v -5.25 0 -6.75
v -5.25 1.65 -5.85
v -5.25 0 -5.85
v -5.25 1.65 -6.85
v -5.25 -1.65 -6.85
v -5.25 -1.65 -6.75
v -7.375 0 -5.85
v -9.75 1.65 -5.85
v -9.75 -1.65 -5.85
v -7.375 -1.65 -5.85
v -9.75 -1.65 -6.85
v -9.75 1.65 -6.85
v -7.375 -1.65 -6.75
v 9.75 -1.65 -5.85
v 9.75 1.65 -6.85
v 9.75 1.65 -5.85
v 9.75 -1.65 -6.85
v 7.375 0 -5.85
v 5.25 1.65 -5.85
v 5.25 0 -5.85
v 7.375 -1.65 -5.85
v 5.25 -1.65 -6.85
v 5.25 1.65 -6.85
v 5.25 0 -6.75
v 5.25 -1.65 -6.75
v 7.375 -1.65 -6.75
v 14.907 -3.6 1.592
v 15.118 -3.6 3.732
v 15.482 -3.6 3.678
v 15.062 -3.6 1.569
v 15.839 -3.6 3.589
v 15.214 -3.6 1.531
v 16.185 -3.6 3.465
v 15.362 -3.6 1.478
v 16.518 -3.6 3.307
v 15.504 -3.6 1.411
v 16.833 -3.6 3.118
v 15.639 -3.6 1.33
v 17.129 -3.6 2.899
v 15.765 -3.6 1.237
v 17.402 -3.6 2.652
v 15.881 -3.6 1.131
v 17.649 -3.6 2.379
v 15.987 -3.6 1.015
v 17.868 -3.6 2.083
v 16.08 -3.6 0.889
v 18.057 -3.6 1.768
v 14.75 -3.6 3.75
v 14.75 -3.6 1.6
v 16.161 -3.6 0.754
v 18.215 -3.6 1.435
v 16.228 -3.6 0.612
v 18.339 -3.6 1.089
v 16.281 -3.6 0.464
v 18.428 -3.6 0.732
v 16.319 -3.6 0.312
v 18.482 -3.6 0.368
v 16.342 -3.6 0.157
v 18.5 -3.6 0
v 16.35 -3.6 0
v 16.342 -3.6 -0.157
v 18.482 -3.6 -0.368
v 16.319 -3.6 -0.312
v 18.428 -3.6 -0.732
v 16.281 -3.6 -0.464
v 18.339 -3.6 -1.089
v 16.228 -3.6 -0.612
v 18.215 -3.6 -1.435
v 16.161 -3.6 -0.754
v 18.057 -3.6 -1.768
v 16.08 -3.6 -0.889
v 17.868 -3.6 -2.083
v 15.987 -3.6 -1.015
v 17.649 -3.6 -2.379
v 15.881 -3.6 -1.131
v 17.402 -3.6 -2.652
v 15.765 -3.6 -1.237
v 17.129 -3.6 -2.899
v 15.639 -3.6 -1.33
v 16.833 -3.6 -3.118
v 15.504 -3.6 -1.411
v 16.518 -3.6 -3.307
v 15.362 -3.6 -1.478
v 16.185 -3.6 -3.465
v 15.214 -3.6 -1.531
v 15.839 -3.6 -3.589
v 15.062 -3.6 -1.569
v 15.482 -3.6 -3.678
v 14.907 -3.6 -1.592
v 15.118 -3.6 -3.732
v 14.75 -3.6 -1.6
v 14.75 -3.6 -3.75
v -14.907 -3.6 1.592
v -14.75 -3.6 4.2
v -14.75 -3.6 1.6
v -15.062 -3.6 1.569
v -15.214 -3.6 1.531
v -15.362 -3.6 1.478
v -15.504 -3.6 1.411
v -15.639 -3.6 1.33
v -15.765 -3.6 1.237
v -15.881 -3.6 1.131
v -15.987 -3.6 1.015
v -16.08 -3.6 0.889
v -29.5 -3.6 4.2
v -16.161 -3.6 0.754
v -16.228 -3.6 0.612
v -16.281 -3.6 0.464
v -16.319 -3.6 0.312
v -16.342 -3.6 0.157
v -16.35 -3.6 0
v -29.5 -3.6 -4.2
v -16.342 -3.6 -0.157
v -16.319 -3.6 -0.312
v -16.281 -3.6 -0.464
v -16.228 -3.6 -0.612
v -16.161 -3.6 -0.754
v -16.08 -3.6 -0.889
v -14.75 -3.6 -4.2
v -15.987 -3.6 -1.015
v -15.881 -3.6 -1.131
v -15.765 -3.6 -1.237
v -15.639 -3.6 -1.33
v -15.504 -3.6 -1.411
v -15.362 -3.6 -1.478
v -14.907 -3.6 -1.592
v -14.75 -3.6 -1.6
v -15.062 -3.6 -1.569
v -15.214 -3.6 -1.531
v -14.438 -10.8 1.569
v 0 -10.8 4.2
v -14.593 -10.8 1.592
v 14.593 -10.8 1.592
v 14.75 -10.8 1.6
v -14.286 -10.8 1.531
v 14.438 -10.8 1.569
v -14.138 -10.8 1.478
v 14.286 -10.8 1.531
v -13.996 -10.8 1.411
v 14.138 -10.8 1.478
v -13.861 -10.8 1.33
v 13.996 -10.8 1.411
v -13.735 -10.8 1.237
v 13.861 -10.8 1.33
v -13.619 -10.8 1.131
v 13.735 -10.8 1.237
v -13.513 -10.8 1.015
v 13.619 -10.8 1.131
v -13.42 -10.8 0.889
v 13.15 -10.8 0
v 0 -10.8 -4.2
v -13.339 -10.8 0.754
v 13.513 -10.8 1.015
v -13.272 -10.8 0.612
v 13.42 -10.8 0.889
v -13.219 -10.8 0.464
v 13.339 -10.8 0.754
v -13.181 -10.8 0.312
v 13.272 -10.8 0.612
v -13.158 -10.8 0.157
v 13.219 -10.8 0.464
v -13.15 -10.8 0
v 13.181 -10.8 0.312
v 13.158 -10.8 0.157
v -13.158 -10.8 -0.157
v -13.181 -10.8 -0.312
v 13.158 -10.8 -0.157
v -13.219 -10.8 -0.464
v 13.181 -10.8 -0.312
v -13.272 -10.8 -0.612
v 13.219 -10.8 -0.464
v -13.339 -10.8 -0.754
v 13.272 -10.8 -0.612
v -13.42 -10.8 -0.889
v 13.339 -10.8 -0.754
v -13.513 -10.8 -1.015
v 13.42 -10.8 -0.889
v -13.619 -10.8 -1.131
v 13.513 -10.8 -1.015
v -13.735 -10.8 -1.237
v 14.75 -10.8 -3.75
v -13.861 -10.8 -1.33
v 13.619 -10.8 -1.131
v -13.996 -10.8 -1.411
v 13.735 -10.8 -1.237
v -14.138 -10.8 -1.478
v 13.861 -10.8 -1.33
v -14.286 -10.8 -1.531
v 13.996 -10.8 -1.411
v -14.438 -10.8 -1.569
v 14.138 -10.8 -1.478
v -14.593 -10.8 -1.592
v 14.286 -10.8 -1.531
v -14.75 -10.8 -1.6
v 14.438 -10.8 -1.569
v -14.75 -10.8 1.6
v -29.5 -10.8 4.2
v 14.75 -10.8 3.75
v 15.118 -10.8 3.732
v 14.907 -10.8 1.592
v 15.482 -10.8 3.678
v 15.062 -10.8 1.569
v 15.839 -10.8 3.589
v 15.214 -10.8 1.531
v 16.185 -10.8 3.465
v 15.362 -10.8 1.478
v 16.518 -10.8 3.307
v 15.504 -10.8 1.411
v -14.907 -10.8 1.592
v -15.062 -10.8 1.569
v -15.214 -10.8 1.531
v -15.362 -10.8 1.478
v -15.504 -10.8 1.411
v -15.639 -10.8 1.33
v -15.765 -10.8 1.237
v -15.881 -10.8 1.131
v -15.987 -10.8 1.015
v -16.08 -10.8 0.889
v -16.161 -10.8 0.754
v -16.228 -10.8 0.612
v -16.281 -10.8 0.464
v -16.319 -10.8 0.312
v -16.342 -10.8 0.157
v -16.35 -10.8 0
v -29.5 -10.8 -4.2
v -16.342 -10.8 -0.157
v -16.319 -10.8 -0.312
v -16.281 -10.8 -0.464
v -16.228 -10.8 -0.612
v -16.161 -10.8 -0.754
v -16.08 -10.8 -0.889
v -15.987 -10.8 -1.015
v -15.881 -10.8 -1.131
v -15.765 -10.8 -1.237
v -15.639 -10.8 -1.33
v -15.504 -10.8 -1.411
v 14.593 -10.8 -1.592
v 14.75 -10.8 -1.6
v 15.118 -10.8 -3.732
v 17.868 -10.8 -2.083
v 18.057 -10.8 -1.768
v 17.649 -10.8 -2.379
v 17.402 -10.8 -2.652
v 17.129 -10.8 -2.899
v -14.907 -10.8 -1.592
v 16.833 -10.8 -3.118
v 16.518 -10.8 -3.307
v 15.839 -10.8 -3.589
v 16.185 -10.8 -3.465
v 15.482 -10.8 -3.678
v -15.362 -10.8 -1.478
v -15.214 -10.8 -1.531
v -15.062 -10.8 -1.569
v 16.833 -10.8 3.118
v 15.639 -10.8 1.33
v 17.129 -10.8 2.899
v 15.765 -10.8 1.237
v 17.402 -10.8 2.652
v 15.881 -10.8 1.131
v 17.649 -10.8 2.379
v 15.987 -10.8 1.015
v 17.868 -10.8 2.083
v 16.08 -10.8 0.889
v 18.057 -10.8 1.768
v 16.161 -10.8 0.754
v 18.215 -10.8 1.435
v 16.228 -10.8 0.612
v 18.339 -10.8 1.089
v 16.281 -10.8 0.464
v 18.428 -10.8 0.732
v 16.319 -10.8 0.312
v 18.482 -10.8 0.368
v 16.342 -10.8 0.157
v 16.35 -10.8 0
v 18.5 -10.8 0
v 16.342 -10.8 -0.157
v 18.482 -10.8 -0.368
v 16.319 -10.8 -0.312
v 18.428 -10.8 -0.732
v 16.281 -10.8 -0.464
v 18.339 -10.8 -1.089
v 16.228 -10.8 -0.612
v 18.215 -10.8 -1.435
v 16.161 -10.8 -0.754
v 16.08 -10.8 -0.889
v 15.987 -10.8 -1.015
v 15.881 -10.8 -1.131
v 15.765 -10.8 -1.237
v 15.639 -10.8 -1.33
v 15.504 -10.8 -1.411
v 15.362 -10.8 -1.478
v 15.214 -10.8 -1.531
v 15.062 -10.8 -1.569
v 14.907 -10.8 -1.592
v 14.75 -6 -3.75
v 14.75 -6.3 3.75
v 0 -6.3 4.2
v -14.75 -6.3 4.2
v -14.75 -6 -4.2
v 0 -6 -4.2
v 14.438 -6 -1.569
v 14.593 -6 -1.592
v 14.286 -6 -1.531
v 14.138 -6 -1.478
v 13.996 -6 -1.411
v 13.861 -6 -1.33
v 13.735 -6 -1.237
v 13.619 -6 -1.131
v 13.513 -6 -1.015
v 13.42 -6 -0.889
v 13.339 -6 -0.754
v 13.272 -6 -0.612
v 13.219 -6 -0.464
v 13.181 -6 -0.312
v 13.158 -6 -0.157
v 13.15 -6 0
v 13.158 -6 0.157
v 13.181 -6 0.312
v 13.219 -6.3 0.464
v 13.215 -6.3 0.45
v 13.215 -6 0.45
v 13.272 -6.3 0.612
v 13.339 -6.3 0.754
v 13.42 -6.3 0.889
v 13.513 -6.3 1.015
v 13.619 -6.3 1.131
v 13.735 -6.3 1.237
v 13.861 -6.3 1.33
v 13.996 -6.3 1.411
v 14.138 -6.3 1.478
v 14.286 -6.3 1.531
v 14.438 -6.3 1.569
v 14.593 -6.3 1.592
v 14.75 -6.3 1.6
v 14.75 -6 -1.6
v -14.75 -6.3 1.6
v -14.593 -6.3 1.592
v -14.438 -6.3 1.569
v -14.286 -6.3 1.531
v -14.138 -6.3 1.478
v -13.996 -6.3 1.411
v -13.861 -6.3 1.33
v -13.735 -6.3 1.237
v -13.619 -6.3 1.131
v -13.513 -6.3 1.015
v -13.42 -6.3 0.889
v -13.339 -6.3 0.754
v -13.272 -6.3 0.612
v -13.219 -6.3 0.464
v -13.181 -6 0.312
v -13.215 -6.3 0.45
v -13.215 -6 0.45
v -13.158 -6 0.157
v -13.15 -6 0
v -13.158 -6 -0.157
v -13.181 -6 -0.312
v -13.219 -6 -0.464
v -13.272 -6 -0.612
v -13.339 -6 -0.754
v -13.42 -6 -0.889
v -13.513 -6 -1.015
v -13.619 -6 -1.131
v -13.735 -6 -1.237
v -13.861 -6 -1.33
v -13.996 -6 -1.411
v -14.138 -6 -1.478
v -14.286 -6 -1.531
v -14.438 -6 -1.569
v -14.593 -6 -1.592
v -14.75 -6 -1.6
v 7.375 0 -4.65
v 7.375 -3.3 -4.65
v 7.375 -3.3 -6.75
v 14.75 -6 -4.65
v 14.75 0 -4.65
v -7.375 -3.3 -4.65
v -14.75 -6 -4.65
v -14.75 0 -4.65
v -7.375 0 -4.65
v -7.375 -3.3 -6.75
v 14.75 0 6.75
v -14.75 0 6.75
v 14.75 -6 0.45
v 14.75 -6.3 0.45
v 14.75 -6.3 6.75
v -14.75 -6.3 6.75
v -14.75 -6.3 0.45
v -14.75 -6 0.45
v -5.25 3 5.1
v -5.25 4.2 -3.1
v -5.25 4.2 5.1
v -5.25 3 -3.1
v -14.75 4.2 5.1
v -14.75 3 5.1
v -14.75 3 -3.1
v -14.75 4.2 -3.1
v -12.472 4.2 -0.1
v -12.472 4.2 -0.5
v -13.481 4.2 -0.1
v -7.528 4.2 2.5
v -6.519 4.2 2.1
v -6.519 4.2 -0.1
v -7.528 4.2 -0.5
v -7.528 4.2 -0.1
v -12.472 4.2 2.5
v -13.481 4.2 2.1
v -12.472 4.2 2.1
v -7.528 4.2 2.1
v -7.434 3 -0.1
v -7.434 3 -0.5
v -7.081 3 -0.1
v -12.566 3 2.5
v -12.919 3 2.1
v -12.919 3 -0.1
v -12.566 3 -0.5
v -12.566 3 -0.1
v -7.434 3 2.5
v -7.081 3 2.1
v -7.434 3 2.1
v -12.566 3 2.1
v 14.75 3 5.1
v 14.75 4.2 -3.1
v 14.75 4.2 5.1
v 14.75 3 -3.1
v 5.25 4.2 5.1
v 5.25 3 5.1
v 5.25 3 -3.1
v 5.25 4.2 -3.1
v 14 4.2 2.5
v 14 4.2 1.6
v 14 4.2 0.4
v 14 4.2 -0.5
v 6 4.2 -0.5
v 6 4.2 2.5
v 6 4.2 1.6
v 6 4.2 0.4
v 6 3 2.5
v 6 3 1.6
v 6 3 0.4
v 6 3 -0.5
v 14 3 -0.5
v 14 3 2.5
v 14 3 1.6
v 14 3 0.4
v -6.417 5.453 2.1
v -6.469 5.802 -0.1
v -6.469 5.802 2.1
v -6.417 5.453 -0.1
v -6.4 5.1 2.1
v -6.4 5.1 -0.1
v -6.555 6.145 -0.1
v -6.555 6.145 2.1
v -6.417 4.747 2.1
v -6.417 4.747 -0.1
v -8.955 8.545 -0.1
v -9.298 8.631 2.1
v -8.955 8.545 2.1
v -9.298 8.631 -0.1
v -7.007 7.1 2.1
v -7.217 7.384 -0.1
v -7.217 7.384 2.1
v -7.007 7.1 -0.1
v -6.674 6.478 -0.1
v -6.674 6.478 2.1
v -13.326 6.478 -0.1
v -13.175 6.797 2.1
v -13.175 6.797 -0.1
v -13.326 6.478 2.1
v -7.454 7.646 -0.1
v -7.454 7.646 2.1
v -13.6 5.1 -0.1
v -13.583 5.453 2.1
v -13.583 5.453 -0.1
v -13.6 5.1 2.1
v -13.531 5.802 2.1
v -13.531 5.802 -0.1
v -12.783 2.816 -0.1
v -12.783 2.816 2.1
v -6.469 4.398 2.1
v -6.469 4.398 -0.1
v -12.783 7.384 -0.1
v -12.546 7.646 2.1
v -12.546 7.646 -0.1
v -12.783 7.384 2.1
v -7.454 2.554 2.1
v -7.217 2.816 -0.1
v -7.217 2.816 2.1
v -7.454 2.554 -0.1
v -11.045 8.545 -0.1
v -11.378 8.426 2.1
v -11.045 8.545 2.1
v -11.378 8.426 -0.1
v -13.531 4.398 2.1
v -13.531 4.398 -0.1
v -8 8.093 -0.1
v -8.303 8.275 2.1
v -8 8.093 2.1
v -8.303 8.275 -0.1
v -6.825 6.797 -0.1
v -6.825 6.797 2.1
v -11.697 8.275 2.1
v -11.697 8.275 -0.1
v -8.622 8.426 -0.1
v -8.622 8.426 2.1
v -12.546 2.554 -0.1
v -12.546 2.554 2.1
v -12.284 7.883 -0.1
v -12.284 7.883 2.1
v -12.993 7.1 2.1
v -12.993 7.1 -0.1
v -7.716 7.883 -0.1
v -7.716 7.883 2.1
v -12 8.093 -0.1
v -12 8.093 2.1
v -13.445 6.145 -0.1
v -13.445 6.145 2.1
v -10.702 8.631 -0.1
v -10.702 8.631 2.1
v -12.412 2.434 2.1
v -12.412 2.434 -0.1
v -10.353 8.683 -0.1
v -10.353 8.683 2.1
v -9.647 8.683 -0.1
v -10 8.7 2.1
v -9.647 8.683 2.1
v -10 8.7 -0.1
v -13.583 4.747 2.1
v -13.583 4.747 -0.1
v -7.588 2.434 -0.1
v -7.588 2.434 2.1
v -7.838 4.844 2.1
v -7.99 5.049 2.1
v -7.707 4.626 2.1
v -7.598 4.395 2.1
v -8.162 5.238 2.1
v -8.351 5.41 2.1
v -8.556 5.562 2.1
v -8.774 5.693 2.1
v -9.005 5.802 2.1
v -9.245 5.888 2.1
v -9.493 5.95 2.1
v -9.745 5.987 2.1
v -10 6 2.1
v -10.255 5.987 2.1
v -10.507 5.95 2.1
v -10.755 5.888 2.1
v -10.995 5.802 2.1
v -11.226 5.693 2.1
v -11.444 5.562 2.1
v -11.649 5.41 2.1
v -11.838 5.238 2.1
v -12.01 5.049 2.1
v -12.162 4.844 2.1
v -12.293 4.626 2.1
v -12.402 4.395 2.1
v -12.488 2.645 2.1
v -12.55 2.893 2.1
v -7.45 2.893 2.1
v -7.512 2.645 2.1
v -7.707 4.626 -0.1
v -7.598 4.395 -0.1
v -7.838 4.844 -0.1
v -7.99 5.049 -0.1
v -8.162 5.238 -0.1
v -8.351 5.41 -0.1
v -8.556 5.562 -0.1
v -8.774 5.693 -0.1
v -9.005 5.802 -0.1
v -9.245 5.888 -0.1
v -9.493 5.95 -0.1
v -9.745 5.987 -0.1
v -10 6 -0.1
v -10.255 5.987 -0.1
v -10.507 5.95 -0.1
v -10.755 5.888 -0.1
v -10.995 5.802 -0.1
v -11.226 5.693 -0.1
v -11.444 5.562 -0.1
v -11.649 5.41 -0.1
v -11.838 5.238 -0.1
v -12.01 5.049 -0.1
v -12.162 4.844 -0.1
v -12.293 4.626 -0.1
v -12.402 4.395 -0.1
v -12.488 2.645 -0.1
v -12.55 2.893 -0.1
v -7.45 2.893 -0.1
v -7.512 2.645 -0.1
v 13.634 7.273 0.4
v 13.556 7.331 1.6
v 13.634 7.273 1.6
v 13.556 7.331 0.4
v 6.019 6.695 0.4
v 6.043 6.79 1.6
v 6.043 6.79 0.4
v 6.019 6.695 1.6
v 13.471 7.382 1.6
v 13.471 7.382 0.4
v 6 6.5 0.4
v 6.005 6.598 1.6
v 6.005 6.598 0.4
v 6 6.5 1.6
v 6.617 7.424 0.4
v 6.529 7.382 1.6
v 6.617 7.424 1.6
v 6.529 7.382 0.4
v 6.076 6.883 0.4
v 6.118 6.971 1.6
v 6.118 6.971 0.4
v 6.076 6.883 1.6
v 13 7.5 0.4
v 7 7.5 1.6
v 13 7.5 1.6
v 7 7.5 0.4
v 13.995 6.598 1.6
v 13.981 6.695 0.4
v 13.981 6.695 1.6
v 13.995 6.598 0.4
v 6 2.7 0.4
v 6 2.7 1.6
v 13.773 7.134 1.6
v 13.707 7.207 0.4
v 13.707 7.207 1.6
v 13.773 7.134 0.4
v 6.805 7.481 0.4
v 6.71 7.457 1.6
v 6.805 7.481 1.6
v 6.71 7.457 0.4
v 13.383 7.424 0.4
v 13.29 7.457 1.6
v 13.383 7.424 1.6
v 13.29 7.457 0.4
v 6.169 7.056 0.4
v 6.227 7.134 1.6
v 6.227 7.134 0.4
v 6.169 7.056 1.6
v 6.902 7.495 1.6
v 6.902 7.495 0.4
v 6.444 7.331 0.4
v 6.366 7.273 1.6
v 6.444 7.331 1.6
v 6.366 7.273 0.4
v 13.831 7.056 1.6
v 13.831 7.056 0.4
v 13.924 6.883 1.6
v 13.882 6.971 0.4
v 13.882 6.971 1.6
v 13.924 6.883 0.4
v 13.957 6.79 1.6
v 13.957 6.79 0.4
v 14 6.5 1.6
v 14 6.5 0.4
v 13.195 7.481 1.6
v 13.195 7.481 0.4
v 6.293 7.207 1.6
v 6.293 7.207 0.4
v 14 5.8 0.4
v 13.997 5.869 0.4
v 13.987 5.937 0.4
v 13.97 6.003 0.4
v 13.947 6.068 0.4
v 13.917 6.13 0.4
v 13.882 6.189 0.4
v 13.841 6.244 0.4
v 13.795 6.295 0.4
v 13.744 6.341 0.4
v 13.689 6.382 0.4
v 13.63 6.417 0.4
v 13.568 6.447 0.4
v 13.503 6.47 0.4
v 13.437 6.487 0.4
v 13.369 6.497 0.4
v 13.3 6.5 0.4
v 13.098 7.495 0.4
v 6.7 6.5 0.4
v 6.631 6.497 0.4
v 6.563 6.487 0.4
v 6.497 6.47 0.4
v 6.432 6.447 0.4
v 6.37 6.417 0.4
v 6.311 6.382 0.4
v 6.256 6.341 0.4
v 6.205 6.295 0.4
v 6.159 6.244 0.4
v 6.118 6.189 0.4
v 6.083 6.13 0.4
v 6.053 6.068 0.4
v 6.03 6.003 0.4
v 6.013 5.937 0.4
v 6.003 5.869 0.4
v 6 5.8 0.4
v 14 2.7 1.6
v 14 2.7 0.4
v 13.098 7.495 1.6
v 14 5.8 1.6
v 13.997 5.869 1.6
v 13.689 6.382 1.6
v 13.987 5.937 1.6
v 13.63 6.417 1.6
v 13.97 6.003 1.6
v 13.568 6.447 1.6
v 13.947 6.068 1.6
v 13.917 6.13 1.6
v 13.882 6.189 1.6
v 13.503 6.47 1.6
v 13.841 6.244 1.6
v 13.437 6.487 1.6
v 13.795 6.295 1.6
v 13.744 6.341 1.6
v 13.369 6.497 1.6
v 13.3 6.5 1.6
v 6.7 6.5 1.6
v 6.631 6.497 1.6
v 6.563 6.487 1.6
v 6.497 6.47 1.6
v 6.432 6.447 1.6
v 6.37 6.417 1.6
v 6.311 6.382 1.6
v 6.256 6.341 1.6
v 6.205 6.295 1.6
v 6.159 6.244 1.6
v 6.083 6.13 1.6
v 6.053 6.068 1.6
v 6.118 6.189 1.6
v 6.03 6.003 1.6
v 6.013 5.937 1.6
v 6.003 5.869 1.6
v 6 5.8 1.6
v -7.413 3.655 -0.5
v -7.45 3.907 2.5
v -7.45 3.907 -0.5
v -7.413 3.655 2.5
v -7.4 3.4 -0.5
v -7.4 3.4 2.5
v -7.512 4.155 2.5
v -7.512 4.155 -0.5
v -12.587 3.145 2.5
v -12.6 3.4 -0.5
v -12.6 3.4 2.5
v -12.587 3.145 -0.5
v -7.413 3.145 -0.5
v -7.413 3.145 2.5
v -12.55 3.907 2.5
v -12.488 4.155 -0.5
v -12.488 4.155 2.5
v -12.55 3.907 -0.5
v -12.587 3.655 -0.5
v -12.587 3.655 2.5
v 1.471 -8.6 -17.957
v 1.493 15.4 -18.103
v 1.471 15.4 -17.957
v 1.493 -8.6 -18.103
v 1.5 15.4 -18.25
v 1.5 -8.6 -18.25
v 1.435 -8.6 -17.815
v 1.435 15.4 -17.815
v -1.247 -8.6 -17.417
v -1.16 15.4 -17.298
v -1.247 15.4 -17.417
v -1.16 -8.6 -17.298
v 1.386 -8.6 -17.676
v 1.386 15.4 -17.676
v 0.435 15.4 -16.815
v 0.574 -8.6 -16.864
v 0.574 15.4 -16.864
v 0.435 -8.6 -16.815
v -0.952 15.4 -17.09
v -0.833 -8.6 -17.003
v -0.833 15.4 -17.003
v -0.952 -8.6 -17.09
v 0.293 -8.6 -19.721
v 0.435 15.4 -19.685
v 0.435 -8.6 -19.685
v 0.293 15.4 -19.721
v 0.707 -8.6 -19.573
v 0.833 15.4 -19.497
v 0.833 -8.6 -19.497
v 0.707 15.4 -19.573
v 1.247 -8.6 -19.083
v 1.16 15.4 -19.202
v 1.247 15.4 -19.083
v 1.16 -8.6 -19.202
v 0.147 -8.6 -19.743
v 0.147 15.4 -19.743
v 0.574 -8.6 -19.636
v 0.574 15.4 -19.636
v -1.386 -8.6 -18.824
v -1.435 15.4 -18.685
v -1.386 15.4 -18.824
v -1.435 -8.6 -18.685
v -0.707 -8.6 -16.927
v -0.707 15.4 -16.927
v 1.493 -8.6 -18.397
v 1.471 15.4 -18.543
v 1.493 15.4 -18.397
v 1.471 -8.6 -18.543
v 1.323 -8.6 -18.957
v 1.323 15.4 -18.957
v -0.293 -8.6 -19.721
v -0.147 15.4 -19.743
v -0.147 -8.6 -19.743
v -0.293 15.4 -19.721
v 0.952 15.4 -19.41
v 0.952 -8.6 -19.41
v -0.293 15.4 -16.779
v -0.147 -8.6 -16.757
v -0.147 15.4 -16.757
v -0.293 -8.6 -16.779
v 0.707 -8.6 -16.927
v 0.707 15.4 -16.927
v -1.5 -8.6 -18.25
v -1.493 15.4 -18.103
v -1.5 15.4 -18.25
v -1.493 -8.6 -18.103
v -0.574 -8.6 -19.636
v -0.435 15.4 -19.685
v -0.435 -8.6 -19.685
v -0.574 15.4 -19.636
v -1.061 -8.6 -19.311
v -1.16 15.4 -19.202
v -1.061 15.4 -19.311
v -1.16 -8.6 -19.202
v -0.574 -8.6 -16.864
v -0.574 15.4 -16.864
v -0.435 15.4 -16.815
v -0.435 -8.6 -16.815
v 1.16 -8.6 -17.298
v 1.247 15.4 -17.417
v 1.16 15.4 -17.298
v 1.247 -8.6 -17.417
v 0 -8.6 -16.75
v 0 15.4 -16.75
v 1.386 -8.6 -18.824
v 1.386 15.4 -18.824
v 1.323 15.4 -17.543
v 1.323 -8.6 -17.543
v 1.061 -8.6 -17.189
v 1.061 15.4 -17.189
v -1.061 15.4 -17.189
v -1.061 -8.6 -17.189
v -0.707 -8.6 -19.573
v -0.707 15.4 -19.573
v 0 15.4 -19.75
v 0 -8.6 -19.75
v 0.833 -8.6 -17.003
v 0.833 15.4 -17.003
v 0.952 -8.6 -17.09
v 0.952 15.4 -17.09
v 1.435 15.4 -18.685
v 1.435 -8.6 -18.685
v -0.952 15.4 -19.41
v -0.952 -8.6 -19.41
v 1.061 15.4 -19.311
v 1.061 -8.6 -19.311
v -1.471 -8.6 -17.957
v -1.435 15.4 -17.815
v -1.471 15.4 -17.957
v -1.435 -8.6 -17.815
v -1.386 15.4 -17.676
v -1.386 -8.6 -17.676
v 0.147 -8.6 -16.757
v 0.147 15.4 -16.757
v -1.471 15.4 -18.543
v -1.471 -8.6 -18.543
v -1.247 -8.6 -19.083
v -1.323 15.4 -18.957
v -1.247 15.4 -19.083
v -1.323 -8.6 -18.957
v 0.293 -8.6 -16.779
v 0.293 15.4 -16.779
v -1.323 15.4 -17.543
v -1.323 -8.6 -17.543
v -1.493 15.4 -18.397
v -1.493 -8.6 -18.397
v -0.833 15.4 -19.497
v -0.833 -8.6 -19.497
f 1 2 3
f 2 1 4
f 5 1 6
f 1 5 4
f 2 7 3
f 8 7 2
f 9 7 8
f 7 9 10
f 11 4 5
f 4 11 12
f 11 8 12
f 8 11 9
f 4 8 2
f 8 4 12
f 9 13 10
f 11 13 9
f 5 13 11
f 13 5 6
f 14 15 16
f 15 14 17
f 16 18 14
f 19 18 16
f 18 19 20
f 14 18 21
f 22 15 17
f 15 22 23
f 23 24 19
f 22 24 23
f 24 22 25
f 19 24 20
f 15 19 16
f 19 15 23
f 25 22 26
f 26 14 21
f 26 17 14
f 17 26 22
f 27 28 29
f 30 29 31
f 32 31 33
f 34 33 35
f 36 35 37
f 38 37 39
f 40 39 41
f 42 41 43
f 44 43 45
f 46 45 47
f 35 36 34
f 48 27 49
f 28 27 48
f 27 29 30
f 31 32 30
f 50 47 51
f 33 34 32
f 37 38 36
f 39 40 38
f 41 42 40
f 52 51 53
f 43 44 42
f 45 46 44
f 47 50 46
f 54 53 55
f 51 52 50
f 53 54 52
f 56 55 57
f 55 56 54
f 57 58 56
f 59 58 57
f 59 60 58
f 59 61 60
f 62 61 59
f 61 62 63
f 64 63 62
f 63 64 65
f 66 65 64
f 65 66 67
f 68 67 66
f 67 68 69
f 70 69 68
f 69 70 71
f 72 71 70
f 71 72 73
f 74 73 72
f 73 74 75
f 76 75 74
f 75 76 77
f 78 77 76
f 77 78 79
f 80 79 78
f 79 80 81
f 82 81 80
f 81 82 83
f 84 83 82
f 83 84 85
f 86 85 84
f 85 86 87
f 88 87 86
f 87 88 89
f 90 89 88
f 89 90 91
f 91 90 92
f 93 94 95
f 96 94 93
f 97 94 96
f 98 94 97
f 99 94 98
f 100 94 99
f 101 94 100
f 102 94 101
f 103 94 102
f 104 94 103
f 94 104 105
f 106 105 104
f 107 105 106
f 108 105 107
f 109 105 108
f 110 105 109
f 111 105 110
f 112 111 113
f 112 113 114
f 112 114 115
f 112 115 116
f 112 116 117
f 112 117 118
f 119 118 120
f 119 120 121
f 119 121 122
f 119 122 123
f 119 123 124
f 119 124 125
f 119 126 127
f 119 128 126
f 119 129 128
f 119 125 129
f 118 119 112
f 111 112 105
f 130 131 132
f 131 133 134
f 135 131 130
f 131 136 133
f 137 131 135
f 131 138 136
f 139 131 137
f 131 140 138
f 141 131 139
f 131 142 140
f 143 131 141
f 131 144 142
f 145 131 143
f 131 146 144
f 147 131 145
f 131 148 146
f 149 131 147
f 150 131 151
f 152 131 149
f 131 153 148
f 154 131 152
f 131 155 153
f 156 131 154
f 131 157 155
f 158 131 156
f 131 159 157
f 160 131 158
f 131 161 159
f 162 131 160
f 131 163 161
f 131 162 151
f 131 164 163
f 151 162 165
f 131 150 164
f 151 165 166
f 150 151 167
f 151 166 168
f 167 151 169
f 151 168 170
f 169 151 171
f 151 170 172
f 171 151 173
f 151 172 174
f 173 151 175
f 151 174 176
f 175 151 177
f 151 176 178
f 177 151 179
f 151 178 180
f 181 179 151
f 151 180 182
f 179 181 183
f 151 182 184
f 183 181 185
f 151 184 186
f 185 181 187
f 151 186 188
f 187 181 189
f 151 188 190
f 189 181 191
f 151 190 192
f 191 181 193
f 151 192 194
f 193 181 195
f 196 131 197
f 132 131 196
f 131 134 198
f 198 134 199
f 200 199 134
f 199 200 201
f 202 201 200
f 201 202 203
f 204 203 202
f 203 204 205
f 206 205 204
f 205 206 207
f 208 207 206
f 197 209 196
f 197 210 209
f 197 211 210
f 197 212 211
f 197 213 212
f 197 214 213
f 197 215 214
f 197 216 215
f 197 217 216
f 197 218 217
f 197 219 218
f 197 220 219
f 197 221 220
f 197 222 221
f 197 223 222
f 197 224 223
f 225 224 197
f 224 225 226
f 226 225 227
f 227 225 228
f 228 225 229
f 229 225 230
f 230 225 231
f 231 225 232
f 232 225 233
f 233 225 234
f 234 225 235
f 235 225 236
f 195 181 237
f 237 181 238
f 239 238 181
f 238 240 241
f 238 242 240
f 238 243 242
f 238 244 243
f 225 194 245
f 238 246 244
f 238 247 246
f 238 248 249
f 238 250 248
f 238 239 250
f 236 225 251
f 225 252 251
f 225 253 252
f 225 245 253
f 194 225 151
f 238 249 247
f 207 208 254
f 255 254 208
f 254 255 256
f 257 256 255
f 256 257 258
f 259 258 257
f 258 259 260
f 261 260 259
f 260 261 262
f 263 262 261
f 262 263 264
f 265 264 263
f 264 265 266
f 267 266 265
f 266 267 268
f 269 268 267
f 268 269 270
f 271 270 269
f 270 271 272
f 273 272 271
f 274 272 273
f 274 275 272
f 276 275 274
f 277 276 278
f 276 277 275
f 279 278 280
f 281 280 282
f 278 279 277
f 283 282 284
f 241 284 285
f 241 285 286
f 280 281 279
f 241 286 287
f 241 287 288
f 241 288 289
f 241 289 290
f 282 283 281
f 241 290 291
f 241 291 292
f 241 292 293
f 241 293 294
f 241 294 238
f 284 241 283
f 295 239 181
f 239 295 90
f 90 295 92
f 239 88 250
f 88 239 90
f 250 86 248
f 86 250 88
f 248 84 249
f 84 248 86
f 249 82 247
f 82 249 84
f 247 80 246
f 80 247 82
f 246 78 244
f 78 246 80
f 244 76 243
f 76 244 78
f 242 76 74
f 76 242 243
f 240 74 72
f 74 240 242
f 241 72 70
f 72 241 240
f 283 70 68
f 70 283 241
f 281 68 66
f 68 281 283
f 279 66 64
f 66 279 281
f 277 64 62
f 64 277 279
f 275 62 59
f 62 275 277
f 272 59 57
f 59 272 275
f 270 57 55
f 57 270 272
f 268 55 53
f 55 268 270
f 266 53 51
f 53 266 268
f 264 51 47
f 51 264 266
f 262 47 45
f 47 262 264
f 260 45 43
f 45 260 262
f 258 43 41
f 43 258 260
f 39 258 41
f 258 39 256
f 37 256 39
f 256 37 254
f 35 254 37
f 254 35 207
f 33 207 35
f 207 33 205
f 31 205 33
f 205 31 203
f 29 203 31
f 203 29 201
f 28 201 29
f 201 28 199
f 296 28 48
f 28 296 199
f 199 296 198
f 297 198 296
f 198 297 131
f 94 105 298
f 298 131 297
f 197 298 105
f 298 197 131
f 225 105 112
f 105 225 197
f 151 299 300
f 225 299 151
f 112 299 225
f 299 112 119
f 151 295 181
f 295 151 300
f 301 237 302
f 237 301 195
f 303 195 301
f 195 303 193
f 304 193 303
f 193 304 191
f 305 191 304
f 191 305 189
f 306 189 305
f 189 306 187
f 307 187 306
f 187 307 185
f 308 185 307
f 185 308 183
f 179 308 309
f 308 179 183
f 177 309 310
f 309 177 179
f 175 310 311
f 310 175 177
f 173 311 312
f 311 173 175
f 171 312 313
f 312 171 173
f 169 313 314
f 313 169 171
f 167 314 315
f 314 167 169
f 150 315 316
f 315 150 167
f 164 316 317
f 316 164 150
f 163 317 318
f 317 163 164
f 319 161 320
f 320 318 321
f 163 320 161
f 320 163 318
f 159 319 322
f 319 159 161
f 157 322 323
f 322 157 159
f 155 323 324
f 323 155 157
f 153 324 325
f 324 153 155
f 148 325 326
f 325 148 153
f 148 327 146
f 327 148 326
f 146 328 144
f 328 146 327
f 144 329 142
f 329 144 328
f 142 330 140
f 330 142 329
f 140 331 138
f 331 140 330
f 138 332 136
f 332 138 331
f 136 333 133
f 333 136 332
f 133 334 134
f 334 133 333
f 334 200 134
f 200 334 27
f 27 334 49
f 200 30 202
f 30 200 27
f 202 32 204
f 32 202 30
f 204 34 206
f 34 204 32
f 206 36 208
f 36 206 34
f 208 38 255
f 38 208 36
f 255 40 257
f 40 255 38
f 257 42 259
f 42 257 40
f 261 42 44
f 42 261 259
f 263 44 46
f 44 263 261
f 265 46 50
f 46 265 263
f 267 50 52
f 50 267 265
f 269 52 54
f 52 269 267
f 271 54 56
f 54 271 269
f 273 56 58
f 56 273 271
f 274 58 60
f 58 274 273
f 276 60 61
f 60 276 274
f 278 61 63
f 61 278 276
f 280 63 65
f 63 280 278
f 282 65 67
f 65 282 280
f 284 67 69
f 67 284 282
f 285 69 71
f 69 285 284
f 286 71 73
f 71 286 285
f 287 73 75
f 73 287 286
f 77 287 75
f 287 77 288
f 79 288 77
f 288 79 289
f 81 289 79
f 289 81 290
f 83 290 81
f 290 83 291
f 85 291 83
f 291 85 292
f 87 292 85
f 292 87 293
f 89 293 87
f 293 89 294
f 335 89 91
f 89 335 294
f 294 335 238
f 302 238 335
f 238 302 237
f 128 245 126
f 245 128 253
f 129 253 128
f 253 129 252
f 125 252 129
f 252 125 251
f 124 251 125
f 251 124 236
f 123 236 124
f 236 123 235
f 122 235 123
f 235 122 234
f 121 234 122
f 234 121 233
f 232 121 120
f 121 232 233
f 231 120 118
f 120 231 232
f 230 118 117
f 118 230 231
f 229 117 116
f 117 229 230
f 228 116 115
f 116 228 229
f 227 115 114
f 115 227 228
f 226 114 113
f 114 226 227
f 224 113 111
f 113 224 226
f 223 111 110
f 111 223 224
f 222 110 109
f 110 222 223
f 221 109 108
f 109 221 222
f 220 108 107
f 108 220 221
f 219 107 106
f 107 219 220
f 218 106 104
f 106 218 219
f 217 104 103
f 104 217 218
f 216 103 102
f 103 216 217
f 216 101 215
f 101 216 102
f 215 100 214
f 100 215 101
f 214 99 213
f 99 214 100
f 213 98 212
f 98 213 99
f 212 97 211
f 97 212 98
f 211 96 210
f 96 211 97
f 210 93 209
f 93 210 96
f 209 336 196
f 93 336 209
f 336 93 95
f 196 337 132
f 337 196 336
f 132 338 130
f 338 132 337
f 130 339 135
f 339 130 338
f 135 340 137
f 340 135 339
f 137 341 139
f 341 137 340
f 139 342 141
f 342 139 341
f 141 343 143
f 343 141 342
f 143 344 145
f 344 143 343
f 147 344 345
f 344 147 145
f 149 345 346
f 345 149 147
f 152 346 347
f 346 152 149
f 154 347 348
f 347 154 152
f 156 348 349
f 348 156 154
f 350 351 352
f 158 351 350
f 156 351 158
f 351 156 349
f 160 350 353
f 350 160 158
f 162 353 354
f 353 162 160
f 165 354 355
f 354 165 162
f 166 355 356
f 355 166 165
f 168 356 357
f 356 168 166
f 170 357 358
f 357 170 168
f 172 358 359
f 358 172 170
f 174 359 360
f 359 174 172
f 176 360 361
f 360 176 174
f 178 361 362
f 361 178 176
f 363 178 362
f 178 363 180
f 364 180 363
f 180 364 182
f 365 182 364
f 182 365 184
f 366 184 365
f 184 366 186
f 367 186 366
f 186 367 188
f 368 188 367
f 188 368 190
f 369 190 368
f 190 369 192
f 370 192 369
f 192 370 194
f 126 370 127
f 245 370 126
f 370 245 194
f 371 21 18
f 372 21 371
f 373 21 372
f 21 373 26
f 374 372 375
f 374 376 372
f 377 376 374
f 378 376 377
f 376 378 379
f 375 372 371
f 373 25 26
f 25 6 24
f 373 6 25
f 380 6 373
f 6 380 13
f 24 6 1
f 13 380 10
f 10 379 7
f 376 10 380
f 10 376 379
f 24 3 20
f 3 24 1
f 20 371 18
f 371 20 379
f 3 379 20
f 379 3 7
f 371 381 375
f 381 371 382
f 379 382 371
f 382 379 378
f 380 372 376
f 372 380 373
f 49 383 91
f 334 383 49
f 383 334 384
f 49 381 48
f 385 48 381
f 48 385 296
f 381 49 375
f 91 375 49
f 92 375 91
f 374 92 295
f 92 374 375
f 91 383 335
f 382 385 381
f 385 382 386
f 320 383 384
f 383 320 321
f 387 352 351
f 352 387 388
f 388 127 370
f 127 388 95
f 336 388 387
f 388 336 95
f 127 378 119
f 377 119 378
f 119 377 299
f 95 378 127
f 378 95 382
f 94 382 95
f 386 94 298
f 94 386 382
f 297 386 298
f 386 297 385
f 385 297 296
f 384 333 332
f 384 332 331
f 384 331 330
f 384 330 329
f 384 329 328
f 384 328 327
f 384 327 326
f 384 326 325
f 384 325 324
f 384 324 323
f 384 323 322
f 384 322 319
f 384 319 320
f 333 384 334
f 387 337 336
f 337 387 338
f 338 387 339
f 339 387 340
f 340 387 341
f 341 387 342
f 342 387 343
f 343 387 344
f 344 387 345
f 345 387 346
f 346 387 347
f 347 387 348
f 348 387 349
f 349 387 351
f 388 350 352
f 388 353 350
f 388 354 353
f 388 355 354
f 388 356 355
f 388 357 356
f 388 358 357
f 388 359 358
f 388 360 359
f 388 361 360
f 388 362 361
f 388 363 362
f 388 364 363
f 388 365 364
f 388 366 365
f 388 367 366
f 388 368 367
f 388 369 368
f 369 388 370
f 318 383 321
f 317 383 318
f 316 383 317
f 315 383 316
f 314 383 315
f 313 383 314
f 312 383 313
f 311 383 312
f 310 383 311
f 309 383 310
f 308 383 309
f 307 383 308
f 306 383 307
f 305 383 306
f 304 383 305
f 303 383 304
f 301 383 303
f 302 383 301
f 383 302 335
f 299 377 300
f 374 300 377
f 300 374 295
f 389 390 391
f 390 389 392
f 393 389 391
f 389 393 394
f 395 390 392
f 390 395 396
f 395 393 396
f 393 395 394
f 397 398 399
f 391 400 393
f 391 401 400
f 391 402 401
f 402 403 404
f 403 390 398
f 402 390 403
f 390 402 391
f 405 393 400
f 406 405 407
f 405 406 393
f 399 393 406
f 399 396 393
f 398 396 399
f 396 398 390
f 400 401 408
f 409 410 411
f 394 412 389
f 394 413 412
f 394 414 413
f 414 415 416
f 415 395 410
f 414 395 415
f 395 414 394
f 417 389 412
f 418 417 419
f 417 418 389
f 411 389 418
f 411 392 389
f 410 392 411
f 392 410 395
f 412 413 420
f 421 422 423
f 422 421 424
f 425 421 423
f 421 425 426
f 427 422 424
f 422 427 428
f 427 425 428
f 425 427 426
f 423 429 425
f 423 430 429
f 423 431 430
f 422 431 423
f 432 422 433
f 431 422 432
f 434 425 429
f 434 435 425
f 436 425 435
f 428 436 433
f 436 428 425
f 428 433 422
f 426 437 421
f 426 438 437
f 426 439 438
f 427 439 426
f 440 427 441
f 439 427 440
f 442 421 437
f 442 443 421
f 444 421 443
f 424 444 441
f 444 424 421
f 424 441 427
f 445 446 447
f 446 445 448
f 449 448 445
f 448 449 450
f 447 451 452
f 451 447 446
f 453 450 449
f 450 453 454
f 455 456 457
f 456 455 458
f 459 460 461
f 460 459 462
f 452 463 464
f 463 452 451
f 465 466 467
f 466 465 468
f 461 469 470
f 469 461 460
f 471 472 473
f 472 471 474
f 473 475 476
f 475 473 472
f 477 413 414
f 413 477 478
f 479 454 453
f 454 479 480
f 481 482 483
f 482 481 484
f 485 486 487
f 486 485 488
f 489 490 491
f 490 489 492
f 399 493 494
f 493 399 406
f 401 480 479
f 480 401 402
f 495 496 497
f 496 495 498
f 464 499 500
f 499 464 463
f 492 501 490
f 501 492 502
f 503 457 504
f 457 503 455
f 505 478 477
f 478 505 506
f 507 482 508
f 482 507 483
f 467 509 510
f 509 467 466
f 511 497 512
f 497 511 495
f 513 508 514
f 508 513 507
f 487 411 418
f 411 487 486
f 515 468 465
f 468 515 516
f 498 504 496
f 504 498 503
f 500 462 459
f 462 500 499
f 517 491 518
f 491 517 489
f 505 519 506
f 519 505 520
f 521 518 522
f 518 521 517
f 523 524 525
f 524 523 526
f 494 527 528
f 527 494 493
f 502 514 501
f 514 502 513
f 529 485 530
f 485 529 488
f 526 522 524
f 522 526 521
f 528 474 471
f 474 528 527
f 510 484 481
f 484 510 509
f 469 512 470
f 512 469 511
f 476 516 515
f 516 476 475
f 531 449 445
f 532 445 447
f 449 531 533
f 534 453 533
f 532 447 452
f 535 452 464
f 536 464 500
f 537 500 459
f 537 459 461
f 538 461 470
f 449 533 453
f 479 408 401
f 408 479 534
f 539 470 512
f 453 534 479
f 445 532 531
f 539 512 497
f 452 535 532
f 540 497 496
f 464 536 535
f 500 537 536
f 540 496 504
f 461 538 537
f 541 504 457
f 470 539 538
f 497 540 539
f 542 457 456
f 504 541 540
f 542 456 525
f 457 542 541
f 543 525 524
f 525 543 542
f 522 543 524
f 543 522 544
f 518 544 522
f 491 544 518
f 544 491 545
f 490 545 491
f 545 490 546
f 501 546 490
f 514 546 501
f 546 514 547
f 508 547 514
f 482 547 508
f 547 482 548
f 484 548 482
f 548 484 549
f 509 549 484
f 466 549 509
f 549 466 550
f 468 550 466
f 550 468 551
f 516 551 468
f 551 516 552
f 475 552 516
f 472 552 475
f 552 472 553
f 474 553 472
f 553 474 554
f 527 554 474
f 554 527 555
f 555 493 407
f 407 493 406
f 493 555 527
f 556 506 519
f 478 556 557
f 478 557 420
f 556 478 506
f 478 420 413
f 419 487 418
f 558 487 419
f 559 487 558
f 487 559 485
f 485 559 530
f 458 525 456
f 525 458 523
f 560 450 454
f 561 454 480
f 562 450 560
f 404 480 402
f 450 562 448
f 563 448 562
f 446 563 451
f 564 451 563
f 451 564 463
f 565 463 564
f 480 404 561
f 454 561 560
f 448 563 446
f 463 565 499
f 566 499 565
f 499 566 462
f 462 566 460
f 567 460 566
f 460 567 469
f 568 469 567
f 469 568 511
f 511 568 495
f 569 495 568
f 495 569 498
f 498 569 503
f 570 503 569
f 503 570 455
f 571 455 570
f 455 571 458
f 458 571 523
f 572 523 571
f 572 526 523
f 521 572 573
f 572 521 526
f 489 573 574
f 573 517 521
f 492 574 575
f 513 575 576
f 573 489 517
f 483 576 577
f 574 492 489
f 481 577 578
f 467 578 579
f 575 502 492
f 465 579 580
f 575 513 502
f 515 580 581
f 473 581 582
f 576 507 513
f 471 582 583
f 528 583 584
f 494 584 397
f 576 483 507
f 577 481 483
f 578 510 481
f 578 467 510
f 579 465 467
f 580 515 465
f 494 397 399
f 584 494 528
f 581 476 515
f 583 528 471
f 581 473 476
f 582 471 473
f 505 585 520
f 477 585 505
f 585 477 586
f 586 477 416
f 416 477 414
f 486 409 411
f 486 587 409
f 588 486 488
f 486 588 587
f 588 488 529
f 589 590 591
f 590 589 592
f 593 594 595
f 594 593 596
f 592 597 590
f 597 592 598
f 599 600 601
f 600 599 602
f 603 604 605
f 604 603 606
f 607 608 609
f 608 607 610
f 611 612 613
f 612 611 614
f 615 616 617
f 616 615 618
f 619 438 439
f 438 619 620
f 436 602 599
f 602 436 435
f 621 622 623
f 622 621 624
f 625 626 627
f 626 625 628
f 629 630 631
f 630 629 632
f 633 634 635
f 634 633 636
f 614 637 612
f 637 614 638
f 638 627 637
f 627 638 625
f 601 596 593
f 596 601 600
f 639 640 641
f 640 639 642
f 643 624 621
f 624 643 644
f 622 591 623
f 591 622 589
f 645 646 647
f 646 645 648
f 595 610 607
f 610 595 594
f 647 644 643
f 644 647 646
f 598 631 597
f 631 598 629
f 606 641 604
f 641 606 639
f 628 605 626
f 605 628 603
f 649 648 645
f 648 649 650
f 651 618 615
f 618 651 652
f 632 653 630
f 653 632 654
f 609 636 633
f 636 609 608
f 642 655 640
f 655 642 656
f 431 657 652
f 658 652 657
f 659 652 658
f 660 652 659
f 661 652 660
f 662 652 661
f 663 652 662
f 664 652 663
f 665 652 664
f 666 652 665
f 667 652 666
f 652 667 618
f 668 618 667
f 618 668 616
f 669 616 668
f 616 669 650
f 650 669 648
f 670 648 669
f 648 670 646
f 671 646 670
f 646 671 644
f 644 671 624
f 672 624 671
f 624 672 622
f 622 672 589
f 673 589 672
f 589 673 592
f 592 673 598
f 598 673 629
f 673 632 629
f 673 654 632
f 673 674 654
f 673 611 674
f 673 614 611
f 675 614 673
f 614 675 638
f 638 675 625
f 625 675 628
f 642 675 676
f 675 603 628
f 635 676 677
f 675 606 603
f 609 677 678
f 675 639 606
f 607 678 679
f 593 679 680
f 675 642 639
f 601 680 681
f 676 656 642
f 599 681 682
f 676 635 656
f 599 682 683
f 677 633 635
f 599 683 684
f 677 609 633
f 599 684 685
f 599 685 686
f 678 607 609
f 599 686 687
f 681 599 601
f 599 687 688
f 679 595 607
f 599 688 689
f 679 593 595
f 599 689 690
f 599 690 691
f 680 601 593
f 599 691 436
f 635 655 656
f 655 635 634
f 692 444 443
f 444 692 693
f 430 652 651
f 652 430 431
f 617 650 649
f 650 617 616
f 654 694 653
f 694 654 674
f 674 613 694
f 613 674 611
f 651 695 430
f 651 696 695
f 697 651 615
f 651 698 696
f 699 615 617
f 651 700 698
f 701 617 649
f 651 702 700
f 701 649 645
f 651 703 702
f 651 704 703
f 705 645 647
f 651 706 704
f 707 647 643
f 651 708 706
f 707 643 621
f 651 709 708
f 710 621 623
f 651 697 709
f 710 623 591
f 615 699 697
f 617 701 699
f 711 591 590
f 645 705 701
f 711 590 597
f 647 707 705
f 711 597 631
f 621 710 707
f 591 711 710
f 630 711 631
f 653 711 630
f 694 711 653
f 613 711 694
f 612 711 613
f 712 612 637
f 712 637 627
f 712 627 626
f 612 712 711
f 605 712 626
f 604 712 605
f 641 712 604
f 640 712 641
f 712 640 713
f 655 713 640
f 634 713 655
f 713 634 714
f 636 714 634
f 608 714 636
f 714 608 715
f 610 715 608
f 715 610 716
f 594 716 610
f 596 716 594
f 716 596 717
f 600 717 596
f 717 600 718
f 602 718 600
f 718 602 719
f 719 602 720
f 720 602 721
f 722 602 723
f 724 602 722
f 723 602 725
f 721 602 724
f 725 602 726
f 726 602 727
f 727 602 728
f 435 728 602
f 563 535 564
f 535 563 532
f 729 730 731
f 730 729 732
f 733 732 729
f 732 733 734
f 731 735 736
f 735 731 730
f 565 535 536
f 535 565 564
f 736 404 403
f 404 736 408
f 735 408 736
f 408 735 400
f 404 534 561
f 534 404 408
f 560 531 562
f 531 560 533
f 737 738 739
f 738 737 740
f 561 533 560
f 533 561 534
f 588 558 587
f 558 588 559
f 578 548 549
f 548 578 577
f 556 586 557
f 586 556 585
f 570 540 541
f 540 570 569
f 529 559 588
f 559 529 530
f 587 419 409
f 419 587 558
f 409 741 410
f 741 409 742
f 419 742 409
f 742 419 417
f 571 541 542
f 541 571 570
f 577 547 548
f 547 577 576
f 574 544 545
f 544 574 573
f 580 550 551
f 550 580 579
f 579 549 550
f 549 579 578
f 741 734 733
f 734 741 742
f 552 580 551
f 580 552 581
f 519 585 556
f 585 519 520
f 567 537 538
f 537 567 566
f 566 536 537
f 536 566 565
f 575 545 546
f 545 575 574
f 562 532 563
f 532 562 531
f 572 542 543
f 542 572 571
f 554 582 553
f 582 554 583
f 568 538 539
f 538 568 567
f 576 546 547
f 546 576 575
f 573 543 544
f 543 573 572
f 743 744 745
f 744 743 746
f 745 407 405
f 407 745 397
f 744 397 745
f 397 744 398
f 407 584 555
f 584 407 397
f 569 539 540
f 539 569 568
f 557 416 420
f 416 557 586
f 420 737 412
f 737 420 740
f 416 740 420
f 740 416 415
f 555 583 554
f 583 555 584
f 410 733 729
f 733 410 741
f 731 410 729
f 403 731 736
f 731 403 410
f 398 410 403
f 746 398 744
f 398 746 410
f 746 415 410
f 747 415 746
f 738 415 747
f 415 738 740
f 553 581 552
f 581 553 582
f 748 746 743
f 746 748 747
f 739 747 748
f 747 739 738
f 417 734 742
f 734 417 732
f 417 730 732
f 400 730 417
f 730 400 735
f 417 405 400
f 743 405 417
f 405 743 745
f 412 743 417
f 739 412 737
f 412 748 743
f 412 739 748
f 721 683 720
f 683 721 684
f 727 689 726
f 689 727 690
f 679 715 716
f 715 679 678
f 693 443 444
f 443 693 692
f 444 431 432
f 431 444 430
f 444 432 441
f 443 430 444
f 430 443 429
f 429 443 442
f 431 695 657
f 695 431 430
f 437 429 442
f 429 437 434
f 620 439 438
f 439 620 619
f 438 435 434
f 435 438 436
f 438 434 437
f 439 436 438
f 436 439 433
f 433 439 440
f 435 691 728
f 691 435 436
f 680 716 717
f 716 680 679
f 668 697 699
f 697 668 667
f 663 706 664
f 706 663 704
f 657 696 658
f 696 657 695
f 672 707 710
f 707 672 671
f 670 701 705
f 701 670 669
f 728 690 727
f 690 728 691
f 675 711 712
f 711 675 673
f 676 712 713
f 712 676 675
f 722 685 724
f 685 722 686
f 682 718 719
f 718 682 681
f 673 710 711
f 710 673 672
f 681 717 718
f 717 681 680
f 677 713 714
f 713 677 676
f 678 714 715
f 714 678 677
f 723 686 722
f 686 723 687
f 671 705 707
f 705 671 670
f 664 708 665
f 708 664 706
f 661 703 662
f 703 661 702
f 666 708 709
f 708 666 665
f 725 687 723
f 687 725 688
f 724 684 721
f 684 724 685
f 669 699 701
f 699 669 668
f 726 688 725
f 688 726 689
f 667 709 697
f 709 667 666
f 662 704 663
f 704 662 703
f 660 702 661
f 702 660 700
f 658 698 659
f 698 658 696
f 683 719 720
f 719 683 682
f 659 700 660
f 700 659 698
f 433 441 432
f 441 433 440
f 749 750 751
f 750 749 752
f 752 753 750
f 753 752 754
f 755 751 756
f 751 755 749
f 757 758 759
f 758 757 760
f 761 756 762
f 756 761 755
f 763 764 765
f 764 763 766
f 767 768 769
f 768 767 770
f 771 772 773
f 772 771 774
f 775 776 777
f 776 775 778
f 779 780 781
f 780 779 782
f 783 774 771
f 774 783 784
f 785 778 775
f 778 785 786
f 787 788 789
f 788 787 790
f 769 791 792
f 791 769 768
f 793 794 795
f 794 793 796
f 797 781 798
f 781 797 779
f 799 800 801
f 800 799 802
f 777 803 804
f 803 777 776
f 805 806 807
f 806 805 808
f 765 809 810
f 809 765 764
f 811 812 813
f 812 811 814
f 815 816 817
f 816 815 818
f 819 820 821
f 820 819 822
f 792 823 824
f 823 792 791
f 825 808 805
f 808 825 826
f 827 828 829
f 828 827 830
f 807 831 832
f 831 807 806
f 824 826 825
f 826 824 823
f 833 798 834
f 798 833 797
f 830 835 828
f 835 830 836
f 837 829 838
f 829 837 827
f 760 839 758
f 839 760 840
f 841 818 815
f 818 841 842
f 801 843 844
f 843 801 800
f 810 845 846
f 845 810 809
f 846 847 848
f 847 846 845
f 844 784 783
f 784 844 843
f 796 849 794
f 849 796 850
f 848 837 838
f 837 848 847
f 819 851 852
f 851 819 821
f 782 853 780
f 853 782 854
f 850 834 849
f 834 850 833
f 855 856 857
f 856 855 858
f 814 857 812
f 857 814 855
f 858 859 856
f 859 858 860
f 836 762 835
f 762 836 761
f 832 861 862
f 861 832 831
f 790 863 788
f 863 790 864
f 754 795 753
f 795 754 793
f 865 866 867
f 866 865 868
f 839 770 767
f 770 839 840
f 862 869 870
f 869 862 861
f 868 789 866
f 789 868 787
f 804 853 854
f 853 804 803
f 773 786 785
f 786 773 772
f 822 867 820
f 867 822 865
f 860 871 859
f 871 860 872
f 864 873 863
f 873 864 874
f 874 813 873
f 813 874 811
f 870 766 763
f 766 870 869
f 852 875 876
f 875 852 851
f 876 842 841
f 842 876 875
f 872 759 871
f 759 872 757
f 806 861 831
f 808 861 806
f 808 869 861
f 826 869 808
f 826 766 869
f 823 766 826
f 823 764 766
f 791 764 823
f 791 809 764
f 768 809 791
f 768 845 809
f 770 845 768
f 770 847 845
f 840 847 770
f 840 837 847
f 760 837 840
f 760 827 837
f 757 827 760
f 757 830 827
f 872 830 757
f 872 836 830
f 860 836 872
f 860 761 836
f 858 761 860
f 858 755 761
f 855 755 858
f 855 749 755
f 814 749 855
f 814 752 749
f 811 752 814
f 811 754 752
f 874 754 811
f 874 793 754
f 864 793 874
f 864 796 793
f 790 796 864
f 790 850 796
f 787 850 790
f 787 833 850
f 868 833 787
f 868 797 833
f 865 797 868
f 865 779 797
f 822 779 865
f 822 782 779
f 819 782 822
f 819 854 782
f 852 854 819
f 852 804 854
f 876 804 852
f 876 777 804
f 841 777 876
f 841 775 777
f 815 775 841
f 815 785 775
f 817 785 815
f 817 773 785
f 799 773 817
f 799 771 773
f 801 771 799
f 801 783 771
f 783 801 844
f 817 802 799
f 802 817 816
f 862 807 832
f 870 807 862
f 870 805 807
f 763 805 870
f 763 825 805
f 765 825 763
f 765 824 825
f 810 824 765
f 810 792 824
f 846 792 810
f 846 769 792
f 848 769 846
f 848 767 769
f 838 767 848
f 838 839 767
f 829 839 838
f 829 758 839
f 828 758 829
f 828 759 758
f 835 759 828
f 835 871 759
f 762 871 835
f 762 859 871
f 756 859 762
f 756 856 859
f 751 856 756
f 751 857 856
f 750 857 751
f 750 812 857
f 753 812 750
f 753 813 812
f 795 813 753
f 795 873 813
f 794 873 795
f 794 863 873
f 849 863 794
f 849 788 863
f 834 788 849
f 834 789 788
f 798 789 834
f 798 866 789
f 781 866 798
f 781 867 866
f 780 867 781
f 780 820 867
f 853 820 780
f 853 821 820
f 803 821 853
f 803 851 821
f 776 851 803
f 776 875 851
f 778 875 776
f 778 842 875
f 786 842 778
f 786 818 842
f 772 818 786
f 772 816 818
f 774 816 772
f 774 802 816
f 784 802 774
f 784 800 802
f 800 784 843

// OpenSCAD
$fn = 64;

// GP2Y0A21YK0F simplified external model
// Coordinate system:
//   origin = center of body
//   +Z = up
//   +Y = front
//   unit = mm

// -----------------------------
// Main dimensions read from datasheet
// -----------------------------
body_w = 37.0;          // overall width incl. ears
body_d = 8.4;           // depth
body_h = 13.5;          // total height incl. lower connector portion / excluding cable

center_block_w = 29.5;  // rectangular lens block width
center_block_h = 8.4;

ear_hole_d = 3.2;
ear_r = 3.75;           // end ear outside radius
hole_pitch = 37 - 2*ear_r; // center-to-center between mounting holes = 29.5
hole_x = hole_pitch/2;  // ±14.75

lens_center_pitch = 20.0;
lens_x = lens_center_pitch/2; // ±10
lens_center_z = 0.0;

// front profile partition heights from bottom
foot_t = 1.0;
lower_h = 2.1;
mid_h = 7.2;
upper_h = 13.5;

// side depths
lower_depth = 3.3;
mid_depth = 7.2;
top_extra = 6.3;     // from front face to rear top end
rear_step = 2.0;     // rear upper lip thickness

// connector / cable opening area
cable_open_w = 10.1;
cable_open_h = 4.0;
cable_open_z0 = -body_h/2 + 1.0;
cable_notch_w = 14.75;
cable_notch_h = 2.4;

// lens protrusions (simplified external features)
lens_outer_d = 7.2;
lens_outer_h = 2.2;
detector_window_w = 8.0;
detector_window_h = 5.8;
detector_window_d = 1.2;

// cable
cable_d = 3.0;
cable_len = 24.0;

// -----------------------------
module rounded_ear_2d()
{
    hull() {
        translate([-center_block_w/2,0]) square([center_block_w, center_block_h], center=true);
        translate([ hole_x,0]) circle(r=ear_r);
        translate([-hole_x,0]) circle(r=ear_r);
    }
}

module front_silhouette_2d()
{
    difference() {
        rounded_ear_2d();
        translate([ hole_x,0]) circle(d=ear_hole_d);
        translate([-hole_x,0]) circle(d=ear_hole_d);
    }
}

module body_core()
{
    // Build from front silhouette, extruded in Y with stepped depth
    union() {
        // mid section
        translate([0, -mid_depth/2, 0])
            rotate([90,0,0])
                linear_extrude(height=mid_depth)
                    front_silhouette_2d();

        // lower connector/board hanging part
        translate([0, -lower_depth/2, -body_h/2 + lower_h/2])
            cube([14.75, lower_depth, lower_h], center=true);

        // top lens case cap
        translate([0, -(top_extra)/2, body_h/2 - (body_h - mid_h)/2])
            cube([center_block_w, top_extra, body_h - mid_h], center=true);

        // rear upper lip
        translate([0, -(top_extra - rear_step/2), body_h/2 - 1.0])
            cube([center_block_w, rear_step, 2.0], center=true);

        // lower front slab under lens face
        translate([0, -(mid_depth-1.2)/2, -body_h/2 + lower_h + (mid_h-lower_h)/2])
            cube([center_block_w, mid_depth-1.2, mid_h-lower_h], center=true);

        // small bottom feet under each lens block (seen in top figure)
        for (x=[-7.5, 7.5])
            translate([x, 0, -body_h/2 - 0.1 + 1.0/2])
                cube([4.5, 3.3, 1.0], center=true);
    }
}

module lens_features()
{
    // Emitter: circular lens barrel
    translate([-lens_x, body_d/2 + lens_outer_h/2 - 0.2, 1.0])
        cylinder(d=lens_outer_d, h=lens_outer_h, center=true);

    // Detector: rounded rectangular / cylindrical protrusion approximation
    translate([ lens_x, body_d/2 + detector_window_d/2 - 0.2, 1.0])
        linear_extrude(height=detector_window_d, center=true)
            offset(r=1.0)
                square([detector_window_w-2.0, detector_window_h-2.0], center=true);

    // Front bezel around optical windows
    for (x=[-lens_x, lens_x])
        translate([x, body_d/2 - 0.6, 1.0])
            cube([9.5, 1.2, 8.2], center=true);
}

module front_optical_recesses()
{
    union() {
        // emitter circular recess
        translate([-lens_x, body_d/2 - 0.8, 1.0])
            cylinder(d=5.2, h=3.0, center=true);

        // detector rectangular recess
        translate([ lens_x, body_d/2 - 0.8, 1.0])
            linear_extrude(height=3.0, center=true)
                offset(r=0.7)
                    square([6.6, 4.8], center=true);
    }
}

module cable_exit_cut()
{
    union() {
        // central lower opening
        translate([0, body_d/2 - 1.3, -body_h/2 + cable_open_h/2 + 0.6])
            cube([cable_open_w, 3.5, cable_open_h], center=true);

        // wider notch at very bottom front
        translate([0, body_d/2 - 0.8, -body_h/2 + cable_notch_h/2 - 0.2])
            cube([cable_notch_w, 2.5, cable_notch_h], center=true);

        // small three pin reliefs
        for (x=[-2.6,0,2.6])
            translate([x, body_d/2 - 1.2, -body_h/2 + 2.8])
                cube([0.9, 2.8, 2.2], center=true);
    }
}

module cable()
{
    // simple round cable from central opening downward
    translate([0, body_d/2 - 0.8, -body_h/2 - cable_len/2 + 0.5])
        rotate([90,0,0])
            cylinder(d=cable_d, h=cable_len, center=true);
}

module sensor()
{
    difference() {
        union() {
            body_core();
            lens_features();
        }
        front_optical_recesses();
        cable_exit_cut();
    }
    cable();
}

sensor();
